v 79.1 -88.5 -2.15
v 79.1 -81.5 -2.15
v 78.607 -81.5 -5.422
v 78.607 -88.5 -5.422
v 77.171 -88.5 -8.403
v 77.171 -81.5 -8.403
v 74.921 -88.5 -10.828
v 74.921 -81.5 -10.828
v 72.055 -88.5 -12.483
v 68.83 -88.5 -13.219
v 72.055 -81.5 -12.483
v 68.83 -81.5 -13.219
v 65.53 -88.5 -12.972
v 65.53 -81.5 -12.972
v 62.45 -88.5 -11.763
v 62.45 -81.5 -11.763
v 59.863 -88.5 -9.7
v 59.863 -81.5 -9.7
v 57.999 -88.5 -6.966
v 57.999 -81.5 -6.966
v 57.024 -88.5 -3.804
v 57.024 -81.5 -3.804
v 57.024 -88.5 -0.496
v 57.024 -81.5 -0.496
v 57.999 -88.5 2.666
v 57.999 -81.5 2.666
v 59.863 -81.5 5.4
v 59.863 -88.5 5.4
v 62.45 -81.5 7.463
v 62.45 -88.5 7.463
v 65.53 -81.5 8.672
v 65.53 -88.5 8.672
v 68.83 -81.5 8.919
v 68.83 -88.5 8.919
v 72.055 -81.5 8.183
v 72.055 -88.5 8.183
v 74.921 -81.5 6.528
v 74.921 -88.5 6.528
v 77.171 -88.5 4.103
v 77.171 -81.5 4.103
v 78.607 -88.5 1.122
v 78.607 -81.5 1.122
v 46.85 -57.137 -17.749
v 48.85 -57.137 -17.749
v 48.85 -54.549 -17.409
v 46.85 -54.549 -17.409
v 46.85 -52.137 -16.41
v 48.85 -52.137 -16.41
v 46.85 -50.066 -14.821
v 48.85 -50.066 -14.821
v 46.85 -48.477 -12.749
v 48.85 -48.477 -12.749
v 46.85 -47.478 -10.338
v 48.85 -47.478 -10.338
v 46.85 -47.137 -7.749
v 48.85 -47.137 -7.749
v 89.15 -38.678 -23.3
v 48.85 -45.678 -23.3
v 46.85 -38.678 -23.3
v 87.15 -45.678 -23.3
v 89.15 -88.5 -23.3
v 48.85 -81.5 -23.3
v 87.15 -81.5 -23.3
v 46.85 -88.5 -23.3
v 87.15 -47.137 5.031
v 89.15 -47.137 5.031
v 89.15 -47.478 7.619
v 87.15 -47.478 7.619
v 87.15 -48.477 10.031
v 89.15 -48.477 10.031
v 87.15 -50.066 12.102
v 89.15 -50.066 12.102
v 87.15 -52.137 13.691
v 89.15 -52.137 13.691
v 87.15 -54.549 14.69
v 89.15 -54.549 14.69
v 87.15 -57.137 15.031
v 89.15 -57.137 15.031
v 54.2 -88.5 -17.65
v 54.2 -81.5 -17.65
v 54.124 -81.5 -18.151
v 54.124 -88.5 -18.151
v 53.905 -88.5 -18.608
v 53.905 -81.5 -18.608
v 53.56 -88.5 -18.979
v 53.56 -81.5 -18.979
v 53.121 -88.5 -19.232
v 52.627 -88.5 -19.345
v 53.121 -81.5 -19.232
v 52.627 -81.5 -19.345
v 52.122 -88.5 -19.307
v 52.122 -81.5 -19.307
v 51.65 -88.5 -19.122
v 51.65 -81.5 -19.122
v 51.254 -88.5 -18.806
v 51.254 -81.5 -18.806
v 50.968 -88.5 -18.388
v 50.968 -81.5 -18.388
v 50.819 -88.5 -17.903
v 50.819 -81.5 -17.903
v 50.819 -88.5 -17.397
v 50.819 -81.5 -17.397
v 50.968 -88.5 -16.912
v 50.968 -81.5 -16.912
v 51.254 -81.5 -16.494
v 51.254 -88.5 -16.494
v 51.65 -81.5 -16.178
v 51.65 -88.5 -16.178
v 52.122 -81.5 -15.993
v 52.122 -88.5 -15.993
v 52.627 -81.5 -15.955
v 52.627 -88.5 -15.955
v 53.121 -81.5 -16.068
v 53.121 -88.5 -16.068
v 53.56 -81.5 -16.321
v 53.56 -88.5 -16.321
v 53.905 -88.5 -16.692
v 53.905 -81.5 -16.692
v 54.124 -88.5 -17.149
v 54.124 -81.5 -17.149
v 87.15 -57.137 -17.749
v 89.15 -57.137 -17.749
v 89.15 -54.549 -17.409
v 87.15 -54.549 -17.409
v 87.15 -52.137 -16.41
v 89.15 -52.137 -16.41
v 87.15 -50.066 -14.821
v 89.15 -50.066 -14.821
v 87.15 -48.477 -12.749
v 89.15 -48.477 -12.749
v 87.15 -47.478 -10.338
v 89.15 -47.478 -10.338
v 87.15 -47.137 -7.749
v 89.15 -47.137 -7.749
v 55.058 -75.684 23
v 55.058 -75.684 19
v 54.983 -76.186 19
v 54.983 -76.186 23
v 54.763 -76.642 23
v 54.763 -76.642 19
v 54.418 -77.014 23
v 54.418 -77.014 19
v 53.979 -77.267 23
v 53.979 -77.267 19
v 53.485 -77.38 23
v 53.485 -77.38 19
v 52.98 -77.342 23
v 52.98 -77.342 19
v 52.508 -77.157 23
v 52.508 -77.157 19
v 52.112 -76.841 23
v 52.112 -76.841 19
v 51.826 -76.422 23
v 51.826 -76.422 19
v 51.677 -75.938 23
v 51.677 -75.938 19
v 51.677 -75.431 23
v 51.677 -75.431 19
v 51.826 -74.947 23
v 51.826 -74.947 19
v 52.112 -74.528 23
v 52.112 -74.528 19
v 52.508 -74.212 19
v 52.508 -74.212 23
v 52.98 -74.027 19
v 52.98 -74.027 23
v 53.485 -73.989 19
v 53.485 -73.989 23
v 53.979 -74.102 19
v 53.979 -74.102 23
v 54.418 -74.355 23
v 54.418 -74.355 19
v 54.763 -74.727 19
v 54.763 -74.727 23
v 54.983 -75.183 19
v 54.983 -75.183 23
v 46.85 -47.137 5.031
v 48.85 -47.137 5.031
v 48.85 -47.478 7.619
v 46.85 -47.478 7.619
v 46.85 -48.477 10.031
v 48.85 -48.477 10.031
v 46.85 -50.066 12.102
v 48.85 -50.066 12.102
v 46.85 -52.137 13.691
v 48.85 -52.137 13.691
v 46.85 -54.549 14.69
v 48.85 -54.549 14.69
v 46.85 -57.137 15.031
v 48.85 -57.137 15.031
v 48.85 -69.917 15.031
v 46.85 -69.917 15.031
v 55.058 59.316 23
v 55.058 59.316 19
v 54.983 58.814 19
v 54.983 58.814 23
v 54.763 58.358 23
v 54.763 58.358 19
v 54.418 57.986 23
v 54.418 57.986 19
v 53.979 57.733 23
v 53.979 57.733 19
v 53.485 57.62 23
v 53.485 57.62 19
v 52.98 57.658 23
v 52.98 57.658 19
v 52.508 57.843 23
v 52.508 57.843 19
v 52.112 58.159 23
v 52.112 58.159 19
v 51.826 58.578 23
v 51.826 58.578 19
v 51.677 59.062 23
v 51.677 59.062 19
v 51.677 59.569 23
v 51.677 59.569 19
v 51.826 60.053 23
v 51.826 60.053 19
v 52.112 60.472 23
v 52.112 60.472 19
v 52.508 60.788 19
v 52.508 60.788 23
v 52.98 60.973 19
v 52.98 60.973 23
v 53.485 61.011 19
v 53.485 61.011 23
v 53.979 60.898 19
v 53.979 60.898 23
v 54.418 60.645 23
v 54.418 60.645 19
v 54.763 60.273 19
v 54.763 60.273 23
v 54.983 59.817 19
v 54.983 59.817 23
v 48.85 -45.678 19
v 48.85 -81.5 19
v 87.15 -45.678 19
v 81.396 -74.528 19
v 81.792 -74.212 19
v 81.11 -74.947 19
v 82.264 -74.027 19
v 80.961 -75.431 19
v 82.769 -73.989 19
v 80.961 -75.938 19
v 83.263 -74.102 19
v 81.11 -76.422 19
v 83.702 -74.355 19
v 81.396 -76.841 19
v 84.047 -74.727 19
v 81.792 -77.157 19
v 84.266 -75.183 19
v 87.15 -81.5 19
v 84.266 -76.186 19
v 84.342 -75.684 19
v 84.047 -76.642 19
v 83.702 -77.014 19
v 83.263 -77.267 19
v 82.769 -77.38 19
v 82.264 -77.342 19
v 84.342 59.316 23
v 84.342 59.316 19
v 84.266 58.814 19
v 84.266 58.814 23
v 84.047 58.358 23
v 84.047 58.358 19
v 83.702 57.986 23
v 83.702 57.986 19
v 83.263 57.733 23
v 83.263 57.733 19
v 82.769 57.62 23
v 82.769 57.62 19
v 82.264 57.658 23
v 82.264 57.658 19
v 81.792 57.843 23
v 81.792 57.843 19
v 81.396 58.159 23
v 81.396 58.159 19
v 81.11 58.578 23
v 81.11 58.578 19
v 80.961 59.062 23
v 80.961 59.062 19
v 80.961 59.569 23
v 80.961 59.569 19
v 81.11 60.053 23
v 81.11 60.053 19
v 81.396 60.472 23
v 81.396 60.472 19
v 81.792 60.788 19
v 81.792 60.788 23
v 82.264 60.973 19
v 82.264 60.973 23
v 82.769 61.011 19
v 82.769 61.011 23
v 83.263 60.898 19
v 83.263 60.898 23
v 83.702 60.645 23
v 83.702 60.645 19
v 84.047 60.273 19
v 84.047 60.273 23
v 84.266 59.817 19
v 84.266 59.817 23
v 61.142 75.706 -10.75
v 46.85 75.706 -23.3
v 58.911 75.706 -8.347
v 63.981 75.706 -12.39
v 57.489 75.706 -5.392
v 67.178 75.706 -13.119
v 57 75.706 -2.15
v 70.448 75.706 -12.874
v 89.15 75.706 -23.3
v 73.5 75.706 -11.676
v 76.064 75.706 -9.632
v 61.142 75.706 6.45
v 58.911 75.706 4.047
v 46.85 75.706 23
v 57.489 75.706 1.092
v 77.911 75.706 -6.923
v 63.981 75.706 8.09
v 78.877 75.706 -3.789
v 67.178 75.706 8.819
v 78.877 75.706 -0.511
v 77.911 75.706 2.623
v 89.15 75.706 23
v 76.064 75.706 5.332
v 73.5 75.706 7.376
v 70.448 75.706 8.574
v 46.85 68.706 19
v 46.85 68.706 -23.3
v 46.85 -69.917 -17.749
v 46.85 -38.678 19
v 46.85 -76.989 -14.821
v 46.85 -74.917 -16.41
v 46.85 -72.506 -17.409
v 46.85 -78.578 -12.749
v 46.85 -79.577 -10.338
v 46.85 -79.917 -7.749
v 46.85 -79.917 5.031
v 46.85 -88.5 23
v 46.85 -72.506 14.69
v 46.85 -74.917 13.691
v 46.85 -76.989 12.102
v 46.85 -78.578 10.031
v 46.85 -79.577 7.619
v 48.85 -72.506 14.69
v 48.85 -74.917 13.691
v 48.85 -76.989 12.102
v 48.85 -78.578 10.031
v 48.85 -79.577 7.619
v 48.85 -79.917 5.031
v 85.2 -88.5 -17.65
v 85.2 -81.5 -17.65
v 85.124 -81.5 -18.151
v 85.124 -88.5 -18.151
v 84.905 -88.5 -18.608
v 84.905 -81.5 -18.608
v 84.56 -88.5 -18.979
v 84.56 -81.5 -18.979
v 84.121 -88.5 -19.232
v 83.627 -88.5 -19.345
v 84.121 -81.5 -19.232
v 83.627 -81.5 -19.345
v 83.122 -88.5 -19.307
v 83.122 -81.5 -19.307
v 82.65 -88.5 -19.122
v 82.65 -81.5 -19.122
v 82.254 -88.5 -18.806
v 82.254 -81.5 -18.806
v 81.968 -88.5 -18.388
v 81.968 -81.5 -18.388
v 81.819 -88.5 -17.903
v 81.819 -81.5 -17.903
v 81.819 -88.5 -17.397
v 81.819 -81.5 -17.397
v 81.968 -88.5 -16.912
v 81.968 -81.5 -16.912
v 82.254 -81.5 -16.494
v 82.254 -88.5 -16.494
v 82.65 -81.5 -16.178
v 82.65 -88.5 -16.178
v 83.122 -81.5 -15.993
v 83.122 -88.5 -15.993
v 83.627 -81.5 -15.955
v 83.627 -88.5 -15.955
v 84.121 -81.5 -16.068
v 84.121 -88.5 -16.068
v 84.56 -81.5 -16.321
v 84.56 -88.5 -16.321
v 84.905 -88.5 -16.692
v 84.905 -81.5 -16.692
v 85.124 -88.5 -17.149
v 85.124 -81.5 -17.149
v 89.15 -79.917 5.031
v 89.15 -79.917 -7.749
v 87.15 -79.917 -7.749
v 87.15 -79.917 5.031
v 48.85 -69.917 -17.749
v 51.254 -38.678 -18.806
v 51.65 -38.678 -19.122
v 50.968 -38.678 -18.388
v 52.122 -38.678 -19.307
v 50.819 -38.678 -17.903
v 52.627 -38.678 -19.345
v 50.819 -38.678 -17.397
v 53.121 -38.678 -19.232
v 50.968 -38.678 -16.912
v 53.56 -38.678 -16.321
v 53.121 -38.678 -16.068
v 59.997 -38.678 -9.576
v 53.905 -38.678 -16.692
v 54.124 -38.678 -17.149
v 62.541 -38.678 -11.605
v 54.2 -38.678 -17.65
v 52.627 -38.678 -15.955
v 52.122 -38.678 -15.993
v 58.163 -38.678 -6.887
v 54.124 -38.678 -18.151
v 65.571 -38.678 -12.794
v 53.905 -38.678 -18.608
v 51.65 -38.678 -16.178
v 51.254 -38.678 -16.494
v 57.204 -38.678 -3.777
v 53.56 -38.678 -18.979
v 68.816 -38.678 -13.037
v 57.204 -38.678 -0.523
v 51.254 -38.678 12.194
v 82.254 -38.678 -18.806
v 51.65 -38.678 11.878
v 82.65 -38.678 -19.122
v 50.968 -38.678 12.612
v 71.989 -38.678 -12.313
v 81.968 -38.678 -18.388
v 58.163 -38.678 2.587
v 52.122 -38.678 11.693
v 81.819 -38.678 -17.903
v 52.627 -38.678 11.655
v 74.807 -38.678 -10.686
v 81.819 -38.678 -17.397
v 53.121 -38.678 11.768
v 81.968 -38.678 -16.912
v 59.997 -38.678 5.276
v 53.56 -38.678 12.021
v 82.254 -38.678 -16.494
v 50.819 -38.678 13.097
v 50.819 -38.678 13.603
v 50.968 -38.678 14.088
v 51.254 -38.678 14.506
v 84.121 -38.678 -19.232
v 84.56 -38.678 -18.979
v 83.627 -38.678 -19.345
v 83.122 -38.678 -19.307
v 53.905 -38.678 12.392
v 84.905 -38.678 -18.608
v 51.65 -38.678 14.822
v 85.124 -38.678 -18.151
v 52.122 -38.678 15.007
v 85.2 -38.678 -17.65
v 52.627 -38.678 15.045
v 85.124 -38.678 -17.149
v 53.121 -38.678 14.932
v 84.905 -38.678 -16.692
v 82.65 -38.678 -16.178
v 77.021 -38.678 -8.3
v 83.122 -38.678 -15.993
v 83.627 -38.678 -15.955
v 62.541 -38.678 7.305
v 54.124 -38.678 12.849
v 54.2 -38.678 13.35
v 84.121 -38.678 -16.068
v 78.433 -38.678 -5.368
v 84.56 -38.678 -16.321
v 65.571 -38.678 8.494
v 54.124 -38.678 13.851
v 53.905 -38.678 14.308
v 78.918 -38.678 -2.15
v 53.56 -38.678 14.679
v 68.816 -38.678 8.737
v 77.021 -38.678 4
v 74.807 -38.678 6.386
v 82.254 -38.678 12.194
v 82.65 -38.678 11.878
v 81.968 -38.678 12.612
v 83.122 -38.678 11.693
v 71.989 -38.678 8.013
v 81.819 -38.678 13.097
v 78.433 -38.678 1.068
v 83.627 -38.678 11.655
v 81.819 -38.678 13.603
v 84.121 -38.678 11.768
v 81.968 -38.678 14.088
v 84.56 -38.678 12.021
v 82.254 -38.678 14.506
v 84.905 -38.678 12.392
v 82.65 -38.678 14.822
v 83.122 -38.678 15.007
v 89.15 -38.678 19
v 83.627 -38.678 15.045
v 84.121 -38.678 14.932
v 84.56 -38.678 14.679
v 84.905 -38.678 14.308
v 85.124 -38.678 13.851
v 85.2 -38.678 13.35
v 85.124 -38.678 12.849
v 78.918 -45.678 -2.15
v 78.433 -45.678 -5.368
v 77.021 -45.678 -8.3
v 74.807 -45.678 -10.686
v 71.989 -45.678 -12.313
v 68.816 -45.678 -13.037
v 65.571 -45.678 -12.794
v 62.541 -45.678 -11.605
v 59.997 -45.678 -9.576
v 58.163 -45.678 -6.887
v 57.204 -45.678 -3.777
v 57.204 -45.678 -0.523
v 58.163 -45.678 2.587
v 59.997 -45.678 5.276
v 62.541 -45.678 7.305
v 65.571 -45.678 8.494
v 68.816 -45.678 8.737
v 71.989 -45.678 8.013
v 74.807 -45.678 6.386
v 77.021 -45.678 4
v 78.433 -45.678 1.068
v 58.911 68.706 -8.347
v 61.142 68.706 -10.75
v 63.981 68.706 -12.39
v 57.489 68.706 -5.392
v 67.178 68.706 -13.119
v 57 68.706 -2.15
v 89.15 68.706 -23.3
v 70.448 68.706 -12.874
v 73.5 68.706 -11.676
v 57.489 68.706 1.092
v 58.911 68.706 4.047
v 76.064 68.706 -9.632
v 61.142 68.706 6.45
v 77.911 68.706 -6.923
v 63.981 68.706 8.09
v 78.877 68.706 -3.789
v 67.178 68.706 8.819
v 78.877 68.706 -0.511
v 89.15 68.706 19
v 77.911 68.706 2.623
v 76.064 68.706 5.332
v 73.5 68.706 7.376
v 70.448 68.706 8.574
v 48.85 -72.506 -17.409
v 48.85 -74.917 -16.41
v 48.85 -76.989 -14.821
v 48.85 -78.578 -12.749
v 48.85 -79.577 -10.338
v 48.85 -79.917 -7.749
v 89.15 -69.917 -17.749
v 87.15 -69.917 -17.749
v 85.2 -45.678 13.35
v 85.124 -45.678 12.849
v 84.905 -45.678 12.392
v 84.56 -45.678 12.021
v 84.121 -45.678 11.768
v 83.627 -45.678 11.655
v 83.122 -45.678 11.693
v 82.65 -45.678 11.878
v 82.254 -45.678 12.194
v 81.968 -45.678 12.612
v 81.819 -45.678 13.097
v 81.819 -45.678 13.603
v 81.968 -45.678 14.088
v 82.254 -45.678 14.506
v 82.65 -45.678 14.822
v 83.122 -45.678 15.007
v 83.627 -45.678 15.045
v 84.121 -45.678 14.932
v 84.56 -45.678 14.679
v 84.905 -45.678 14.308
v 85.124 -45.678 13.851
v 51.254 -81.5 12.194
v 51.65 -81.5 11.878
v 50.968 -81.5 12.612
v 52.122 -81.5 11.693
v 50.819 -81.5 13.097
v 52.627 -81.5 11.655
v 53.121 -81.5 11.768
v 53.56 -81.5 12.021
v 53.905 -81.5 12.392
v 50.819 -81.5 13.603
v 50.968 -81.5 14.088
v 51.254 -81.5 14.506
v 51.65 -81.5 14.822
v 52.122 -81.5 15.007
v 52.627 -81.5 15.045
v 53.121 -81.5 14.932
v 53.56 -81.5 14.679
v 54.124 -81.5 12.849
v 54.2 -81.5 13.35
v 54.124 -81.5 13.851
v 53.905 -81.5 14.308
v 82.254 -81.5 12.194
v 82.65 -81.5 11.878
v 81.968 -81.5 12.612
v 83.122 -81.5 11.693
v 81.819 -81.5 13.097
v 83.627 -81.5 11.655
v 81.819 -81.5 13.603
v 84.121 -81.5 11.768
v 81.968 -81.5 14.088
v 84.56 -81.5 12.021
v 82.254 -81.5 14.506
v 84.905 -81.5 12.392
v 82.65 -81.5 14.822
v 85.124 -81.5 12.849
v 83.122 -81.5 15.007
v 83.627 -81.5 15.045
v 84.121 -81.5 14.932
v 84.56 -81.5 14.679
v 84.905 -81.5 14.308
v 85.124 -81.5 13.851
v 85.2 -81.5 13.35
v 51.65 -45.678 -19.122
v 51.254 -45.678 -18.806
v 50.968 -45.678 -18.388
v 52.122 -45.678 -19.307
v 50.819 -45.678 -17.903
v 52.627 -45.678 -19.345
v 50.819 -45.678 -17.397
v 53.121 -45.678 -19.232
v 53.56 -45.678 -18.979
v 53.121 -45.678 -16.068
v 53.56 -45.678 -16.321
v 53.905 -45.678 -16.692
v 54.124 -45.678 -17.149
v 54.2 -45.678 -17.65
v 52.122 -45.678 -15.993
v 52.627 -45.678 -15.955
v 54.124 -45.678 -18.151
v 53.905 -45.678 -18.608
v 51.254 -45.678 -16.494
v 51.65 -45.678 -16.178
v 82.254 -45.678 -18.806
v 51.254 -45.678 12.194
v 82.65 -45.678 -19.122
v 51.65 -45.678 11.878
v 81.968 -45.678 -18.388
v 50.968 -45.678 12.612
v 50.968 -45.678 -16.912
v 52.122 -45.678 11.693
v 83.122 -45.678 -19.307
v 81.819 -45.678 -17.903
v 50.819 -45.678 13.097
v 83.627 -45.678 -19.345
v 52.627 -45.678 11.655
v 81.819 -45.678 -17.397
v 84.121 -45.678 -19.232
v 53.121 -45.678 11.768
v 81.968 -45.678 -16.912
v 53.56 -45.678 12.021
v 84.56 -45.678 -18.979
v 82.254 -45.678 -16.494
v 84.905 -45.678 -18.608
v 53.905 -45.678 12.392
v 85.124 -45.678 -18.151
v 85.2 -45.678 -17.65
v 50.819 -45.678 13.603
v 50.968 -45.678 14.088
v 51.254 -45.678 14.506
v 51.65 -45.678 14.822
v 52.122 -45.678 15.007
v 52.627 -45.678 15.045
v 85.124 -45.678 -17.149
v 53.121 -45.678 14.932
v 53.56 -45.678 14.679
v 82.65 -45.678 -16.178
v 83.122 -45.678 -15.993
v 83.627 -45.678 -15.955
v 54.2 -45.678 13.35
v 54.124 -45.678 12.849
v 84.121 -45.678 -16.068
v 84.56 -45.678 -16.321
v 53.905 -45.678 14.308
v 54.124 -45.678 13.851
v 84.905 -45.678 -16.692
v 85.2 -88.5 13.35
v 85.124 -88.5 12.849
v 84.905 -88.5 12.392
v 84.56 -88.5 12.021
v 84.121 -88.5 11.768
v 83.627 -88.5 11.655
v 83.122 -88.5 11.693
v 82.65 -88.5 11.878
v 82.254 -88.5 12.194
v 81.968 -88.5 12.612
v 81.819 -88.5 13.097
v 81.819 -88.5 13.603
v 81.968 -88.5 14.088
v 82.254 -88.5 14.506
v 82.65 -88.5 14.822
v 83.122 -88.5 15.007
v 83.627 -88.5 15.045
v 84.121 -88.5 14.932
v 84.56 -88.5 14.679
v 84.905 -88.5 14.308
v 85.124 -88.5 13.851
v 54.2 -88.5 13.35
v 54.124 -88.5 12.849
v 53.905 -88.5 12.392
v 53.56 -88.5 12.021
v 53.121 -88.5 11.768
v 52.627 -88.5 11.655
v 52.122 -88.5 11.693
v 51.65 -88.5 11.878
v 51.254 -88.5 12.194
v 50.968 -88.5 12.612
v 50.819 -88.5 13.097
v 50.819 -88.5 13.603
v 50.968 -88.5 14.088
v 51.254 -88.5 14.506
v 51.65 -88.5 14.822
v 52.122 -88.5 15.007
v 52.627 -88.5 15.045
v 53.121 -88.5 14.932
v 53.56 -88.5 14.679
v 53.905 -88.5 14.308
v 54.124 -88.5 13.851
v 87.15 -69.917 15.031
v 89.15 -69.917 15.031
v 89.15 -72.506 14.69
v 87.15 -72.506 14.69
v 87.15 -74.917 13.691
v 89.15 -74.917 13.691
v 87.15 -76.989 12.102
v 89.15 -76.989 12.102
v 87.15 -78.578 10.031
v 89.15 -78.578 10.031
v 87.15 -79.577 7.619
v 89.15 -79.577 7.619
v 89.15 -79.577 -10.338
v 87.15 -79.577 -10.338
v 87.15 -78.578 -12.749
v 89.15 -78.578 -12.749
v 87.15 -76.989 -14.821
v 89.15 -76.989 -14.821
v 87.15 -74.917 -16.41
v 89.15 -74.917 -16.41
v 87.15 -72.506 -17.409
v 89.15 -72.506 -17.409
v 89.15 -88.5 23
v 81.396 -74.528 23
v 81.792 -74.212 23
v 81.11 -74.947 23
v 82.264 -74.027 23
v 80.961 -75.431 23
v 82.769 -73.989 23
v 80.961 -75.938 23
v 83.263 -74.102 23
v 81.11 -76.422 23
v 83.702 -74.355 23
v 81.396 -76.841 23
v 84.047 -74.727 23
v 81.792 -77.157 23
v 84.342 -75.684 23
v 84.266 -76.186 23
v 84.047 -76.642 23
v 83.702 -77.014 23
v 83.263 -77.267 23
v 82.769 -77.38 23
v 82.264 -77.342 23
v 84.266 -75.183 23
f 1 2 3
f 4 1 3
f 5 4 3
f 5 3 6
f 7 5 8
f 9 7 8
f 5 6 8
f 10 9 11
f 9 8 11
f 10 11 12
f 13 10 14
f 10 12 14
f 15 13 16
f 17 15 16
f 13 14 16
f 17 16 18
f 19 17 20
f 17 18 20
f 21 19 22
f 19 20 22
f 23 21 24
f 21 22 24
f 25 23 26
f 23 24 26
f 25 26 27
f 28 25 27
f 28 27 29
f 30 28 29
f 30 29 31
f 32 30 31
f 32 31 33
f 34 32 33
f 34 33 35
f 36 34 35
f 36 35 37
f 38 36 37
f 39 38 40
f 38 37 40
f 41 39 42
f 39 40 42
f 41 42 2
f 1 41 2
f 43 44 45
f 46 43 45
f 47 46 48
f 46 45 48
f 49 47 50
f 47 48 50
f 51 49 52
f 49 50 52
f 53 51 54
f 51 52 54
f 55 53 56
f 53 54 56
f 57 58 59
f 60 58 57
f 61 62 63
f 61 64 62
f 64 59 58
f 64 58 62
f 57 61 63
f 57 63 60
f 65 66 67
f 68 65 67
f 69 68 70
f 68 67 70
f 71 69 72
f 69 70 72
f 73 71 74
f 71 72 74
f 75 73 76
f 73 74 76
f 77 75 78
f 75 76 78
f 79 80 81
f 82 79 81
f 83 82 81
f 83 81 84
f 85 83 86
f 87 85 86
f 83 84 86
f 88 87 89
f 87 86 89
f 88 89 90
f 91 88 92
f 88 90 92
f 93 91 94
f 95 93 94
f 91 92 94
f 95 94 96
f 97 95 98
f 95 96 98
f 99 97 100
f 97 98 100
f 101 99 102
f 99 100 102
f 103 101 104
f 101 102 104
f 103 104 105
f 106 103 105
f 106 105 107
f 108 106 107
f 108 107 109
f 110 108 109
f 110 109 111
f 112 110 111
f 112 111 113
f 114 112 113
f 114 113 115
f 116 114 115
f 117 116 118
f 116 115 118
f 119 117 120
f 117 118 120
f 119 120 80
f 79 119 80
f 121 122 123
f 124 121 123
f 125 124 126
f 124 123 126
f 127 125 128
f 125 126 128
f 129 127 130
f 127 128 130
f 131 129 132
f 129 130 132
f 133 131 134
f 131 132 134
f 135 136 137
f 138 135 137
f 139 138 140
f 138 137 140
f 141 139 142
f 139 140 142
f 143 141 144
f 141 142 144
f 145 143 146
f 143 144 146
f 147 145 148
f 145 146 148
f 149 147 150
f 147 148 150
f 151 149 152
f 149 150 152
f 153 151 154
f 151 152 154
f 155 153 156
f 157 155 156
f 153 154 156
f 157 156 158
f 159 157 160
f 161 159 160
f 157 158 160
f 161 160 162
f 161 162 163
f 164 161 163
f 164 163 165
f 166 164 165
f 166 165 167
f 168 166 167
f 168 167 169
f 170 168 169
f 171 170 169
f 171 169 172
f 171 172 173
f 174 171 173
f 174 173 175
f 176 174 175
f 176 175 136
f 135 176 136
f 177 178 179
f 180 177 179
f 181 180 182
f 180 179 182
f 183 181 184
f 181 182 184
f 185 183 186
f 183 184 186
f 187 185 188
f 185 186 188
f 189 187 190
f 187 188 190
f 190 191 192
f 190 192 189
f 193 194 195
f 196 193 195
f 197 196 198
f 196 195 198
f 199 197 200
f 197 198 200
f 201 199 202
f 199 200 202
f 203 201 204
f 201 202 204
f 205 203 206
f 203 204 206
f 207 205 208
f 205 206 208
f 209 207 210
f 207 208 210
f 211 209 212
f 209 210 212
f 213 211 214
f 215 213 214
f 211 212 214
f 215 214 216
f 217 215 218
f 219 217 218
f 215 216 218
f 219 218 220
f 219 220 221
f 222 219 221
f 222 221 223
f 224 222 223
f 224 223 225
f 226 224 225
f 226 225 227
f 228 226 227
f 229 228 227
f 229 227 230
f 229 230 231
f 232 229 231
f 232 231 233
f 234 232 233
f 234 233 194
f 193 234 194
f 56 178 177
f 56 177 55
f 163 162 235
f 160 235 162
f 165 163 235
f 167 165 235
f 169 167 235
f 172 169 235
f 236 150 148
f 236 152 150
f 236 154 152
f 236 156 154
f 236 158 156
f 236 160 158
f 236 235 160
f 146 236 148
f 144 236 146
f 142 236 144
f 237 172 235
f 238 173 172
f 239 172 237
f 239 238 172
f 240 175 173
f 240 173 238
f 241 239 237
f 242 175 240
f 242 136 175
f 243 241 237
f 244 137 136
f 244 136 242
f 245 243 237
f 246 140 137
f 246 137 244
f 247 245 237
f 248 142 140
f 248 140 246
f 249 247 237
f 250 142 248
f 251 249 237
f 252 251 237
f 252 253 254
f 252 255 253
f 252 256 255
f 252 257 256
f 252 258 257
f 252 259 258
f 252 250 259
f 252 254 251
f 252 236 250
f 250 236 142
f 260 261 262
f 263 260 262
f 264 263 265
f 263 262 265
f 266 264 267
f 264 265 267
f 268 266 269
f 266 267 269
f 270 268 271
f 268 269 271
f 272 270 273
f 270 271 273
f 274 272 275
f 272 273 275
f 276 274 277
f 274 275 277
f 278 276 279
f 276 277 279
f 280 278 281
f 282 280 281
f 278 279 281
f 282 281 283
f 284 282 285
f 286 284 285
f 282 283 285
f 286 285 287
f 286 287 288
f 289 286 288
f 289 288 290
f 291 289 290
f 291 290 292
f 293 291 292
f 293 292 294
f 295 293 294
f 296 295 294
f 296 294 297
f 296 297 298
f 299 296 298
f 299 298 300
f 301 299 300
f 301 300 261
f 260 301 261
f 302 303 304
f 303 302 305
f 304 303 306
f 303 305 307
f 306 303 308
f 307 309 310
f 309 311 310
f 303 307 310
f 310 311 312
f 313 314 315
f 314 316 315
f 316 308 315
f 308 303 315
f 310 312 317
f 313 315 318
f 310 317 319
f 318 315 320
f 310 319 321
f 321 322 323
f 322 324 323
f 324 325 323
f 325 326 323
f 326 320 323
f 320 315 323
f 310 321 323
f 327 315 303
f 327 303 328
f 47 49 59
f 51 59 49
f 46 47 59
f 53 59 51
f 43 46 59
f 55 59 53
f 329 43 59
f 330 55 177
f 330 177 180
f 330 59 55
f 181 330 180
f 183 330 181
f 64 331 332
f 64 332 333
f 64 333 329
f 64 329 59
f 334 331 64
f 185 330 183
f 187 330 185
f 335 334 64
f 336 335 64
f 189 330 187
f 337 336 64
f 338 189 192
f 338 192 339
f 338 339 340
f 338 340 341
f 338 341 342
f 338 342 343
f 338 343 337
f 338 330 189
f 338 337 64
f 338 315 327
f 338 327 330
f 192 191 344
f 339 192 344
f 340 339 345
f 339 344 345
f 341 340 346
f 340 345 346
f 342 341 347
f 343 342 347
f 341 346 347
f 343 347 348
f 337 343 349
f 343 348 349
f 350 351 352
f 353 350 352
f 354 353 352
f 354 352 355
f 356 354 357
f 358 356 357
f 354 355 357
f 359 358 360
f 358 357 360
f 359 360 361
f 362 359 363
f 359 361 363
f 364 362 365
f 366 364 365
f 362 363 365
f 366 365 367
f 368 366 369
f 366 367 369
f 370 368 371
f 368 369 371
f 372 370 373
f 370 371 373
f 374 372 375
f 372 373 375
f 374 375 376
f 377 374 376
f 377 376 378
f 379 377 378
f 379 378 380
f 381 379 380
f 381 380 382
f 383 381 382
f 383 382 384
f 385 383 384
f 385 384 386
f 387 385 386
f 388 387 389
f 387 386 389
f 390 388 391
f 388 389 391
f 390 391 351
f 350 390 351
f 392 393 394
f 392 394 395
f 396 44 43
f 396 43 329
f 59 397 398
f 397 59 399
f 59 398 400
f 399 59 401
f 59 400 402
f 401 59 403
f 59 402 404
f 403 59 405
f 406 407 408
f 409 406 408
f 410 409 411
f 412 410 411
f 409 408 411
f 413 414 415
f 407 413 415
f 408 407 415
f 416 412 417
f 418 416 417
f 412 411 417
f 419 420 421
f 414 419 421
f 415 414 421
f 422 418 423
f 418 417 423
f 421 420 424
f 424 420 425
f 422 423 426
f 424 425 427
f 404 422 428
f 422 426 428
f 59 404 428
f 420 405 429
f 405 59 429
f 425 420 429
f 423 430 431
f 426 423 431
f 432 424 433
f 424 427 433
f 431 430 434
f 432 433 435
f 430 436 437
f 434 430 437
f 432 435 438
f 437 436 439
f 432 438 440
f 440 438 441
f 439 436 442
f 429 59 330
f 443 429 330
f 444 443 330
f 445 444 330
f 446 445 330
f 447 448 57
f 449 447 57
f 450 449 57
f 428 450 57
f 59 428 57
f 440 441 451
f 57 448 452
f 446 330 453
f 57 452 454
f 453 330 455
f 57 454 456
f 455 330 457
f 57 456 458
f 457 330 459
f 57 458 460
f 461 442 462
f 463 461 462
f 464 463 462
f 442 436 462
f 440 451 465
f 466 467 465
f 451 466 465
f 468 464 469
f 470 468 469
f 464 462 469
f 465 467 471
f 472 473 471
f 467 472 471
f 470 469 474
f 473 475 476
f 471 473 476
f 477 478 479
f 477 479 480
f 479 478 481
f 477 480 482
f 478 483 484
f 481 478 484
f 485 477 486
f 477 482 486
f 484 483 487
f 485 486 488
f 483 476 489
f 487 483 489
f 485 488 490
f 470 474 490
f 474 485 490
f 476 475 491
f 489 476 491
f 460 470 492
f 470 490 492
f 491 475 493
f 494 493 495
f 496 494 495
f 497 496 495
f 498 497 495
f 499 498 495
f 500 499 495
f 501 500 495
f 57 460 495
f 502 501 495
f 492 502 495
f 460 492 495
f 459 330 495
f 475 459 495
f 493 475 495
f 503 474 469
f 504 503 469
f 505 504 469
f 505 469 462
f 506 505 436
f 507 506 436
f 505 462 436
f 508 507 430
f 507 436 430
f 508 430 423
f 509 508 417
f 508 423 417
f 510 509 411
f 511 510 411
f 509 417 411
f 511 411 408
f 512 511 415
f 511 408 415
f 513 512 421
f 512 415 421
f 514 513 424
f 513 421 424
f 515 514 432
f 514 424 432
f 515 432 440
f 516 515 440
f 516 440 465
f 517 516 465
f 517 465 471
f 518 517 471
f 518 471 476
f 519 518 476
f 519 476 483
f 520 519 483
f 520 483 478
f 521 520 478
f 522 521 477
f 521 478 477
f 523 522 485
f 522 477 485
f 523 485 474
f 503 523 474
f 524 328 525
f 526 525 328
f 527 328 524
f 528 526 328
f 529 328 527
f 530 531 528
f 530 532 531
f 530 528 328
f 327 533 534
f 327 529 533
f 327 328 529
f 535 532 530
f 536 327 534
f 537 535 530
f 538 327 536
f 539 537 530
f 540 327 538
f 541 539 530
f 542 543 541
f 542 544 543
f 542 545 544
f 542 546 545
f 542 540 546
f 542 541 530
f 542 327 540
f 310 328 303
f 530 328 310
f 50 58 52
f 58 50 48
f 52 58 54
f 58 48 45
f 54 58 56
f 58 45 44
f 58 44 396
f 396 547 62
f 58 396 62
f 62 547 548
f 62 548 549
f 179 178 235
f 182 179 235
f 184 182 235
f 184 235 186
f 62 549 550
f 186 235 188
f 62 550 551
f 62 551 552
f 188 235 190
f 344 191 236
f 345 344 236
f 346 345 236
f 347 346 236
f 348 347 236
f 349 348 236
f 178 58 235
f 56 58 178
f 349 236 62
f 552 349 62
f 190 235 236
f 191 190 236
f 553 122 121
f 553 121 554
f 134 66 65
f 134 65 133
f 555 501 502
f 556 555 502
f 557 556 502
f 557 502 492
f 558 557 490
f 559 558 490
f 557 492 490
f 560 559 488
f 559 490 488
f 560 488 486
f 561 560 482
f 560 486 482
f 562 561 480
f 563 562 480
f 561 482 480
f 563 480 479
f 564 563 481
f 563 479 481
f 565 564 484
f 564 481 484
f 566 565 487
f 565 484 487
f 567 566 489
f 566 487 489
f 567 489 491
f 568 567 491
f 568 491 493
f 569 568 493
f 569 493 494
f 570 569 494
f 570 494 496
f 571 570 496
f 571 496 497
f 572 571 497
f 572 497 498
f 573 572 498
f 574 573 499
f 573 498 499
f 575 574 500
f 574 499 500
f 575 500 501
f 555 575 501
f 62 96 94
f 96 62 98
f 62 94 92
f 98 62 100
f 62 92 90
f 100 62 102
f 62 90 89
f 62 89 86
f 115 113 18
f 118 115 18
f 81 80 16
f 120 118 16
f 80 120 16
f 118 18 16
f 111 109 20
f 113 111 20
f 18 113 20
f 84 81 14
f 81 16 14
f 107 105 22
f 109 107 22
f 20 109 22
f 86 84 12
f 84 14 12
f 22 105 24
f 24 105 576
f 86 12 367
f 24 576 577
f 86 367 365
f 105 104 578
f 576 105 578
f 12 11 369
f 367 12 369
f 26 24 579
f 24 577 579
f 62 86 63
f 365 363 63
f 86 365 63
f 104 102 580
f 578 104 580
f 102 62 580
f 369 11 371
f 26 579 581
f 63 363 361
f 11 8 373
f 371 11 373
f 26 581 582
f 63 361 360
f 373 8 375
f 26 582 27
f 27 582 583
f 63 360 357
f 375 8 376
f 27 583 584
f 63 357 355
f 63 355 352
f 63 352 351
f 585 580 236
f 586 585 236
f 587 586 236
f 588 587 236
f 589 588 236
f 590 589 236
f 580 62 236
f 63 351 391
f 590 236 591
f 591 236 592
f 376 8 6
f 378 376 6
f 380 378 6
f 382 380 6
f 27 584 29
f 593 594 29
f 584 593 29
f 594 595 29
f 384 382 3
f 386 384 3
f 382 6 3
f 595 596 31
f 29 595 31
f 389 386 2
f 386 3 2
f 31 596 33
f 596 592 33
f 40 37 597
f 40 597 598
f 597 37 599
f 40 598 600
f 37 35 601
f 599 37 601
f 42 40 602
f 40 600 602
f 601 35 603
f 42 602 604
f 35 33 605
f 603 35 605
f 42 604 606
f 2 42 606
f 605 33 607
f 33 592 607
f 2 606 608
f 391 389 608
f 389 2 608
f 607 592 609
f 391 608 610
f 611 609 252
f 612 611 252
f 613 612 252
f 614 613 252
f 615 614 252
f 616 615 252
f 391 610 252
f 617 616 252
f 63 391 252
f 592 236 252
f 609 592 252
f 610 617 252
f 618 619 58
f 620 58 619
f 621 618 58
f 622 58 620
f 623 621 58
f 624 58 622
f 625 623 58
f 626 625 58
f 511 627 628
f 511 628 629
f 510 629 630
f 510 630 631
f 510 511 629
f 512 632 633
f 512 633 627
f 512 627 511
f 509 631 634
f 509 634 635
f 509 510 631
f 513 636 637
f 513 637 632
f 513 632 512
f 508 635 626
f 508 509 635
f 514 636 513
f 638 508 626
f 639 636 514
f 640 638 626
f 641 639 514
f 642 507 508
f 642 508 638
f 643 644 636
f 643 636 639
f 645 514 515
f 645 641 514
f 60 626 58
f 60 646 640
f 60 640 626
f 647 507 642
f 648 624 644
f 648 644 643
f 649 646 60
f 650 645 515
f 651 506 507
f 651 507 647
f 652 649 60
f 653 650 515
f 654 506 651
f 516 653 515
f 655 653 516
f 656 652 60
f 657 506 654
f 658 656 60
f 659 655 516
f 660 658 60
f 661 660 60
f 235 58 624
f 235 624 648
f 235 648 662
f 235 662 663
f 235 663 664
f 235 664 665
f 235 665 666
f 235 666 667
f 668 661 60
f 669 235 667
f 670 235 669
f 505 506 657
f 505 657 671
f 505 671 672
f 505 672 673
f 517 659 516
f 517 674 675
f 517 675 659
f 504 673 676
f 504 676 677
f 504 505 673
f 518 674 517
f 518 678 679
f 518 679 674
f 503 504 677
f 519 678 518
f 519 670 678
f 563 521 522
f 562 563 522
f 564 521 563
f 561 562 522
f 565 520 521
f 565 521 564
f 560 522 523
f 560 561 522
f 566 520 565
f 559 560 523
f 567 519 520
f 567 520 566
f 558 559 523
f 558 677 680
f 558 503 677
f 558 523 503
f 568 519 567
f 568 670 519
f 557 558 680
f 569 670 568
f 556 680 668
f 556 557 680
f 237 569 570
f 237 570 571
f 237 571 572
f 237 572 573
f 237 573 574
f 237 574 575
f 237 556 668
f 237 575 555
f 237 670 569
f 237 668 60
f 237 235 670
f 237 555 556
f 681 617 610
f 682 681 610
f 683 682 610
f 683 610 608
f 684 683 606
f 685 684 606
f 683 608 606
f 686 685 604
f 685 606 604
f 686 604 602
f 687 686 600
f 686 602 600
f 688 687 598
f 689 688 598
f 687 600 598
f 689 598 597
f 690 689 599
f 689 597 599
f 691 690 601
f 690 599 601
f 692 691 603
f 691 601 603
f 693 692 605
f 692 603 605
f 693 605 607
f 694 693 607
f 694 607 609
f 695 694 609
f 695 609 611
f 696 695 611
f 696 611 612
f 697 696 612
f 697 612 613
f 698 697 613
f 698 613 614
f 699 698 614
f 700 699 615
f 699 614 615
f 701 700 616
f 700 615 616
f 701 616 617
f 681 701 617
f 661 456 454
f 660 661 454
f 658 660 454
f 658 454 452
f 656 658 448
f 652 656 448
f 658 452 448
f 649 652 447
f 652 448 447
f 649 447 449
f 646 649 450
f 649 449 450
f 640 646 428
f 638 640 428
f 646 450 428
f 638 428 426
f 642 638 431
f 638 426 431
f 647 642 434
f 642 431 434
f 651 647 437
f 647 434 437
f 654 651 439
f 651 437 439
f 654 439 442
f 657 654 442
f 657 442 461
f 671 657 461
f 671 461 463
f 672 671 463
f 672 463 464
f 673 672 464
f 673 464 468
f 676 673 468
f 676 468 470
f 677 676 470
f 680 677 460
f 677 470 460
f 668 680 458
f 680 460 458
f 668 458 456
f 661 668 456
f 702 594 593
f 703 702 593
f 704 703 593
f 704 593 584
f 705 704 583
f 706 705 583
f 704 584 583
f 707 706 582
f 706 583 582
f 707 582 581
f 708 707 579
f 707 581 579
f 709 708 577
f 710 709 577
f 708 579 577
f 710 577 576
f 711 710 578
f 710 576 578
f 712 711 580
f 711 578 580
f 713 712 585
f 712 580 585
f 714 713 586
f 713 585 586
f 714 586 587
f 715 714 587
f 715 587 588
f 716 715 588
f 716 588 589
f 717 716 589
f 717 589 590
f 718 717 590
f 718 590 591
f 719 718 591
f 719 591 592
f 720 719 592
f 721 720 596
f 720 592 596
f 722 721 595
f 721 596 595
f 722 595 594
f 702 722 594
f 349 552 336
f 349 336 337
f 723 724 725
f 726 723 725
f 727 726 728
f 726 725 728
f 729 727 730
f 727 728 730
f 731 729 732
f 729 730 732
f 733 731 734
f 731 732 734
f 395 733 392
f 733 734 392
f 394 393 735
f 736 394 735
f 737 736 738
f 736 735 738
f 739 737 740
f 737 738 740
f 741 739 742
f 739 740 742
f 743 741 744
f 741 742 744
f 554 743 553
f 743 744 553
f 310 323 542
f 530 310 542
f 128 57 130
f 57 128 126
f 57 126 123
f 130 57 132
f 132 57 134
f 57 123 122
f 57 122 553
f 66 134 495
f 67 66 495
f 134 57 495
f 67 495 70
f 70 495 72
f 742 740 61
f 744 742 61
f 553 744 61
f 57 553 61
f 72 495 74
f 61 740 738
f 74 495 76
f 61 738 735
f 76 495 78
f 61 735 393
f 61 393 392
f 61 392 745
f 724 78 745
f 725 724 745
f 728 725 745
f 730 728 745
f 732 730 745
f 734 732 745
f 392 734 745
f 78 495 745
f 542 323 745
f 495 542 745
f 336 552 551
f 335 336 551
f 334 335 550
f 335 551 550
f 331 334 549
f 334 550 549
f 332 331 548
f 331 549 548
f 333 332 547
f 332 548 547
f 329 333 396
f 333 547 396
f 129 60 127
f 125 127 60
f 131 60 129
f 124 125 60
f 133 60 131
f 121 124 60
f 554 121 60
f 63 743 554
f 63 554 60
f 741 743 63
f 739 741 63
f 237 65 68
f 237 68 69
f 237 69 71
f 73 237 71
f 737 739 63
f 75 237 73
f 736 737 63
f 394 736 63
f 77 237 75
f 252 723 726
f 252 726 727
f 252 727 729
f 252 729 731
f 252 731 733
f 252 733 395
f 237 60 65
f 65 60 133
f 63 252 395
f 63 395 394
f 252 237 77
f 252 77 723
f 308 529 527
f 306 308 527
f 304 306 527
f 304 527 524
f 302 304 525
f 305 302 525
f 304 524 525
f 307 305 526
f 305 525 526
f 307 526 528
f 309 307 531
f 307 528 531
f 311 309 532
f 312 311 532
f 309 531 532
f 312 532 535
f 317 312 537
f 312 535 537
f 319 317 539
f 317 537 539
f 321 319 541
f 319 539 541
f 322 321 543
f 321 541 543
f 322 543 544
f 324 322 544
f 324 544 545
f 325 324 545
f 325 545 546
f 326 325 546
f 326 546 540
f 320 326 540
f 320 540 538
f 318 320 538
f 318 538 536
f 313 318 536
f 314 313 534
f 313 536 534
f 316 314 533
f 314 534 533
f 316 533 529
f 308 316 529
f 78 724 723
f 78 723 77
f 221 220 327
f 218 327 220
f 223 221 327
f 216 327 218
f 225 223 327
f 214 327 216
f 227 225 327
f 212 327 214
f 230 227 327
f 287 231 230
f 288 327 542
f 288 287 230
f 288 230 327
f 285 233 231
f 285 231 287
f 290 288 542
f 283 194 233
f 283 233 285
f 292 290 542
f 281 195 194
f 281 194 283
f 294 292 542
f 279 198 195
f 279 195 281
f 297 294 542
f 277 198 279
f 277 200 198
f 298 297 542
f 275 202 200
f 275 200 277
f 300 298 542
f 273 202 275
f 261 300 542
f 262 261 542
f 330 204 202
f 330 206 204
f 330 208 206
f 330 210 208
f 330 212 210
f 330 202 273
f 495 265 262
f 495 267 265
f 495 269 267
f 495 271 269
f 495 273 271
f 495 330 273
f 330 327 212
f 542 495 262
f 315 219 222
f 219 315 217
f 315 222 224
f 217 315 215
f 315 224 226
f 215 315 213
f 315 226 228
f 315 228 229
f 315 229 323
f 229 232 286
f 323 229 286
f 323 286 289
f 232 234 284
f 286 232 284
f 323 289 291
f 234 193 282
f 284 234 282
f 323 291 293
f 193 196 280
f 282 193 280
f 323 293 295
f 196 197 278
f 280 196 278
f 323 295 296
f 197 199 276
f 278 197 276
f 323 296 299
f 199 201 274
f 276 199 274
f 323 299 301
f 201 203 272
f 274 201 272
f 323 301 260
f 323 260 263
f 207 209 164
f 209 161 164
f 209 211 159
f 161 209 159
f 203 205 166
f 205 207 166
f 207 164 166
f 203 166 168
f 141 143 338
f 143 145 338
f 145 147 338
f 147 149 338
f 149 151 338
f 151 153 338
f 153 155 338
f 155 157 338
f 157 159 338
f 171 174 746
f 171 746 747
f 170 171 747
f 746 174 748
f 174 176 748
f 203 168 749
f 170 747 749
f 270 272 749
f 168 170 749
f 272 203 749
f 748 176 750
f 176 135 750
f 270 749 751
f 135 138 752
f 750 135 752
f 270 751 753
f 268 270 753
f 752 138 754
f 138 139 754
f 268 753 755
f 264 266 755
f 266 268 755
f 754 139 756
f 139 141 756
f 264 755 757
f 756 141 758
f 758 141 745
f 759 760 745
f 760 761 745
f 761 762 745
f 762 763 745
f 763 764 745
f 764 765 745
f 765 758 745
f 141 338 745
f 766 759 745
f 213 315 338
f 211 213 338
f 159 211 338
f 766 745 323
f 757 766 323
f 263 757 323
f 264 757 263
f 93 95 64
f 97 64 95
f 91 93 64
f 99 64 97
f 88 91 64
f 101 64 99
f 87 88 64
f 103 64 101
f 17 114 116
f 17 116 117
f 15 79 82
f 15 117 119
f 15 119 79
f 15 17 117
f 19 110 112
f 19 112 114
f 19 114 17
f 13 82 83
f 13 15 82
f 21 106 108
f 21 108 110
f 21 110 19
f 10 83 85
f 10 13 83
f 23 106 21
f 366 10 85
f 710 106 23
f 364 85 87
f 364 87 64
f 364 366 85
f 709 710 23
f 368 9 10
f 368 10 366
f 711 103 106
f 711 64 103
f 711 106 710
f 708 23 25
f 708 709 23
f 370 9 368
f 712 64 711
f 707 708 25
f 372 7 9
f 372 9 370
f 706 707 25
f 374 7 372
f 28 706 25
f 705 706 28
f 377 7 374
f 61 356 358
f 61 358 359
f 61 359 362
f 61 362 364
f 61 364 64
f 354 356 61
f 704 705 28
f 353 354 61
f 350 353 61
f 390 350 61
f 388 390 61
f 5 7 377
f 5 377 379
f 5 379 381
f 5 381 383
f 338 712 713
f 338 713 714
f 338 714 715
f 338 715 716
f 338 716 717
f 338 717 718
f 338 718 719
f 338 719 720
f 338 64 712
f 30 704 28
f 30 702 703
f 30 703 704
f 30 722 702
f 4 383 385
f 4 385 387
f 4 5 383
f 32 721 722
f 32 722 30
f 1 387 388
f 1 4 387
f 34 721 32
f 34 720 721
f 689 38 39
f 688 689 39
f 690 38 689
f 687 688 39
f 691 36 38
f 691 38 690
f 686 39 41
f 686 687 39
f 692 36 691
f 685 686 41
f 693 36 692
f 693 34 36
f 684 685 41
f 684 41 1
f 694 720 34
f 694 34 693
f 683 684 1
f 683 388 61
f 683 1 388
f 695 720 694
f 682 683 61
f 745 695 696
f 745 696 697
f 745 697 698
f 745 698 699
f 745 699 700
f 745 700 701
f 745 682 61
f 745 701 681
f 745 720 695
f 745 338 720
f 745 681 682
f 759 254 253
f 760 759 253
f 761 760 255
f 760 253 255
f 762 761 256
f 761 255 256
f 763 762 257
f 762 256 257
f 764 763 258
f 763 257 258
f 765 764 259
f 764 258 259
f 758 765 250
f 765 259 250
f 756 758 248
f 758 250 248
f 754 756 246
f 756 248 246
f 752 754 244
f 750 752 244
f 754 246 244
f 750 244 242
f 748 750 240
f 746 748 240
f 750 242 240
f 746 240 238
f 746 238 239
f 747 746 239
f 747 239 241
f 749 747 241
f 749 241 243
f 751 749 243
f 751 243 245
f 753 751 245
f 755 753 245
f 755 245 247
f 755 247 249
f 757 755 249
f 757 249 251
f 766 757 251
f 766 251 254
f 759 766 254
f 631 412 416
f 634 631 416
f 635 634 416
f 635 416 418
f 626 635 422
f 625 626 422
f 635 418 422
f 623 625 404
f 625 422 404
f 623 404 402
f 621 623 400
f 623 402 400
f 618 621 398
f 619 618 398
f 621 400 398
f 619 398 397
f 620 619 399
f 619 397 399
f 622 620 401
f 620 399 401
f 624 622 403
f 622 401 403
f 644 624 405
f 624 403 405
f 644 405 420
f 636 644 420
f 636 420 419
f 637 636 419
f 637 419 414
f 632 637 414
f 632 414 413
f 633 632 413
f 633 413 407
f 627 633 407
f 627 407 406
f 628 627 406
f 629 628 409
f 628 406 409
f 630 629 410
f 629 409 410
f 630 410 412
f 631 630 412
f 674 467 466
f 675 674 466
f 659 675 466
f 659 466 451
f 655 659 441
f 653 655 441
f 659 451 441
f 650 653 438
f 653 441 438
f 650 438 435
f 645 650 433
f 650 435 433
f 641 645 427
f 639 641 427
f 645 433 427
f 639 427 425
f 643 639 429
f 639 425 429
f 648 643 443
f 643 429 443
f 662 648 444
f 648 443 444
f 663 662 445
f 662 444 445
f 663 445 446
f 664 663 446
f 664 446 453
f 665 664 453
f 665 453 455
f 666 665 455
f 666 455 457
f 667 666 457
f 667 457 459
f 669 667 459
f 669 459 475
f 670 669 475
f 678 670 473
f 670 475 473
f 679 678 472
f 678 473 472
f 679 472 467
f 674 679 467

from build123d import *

# Parameters (mm, degrees)
SKETCH029_W             = 42.3
SKETCH029_H             = 164.206055
PAD013_DEPTH            = 4
SKETCH030_W             = 42.3
SKETCH030_H             = 7
PAD014_DEPTH            = 42.3
SKETCH125_W             = 2
SKETCH125_H             = 35.8216107414
PAD049_DEPTH            = 42.3
SKETCH126_R             = 1.7
SKETCH126_R_2           = 10.9177905076
POCKET019_DEPTH         = 7
SKETCH127_R             = 1.7
SKETCH127_R_2           = 11.1
POCKET020_DEPTH         = 7
POCKET021_DEPTH         = 45
SKETCH129_R             = 11
POCKET022_DEPTH         = 7
SKETCH133_R             = 1.7
POCKET026_DEPTH         = 5
BODY025_PITCH_ANGLE     = 90
BODY025_PLACEMENT_ANGLE = -90


with BuildPart() as part:
    # Sketch029 → Pad013 (new body)
    with BuildSketch(Plane.YZ):
        with Locations((0, 4.8969725)):
            Rectangle(SKETCH029_W, SKETCH029_H)
    extrude(amount=PAD013_DEPTH)

    # Sketch030 (on Face6 of Pad013) → Pad014 (join)
    with BuildSketch(Plane.YZ.offset(4)):
        with Locations((0, 40.6783892586)):
            Rectangle(SKETCH030_W, SKETCH030_H)
        with Locations((0, 83.5)):
            Rectangle(SKETCH030_W, SKETCH030_H)
        with Locations((0, -73.706055)):
            Rectangle(SKETCH030_W, SKETCH030_H)
    extrude(amount=PAD014_DEPTH)

    # Sketch125 → Pad049 (join)
    with BuildSketch(Plane.YZ.offset(4)):
        with Locations((-20.15, 62.0891946293)):
            Rectangle(SKETCH125_W, SKETCH125_H)
        with Locations((20.15, 62.0891946293)):
            Rectangle(SKETCH125_W, SKETCH125_H)
    extrude(amount=PAD049_DEPTH)

    # Sketch126 (on Face20 of Pad049) → Pocket019 (cut)
    with BuildSketch(Plane.YX.offset(-37.1783892586)):
        with Locations((-15.5, 40.65)):
            Circle(SKETCH126_R)
        with Locations((15.5, 40.65)):
            Circle(SKETCH126_R)
        with Locations((15.5, 9.65)):
            Circle(SKETCH126_R)
        with Locations((-15.5, 9.65)):
            Circle(SKETCH126_R)
        with Locations((0, 25.15)):
            Circle(SKETCH126_R_2)
    extrude(amount=-POCKET019_DEPTH, mode=Mode.SUBTRACT)

    # Sketch127 (on Face24 of Pocket019) → Pocket020 (cut)
    with BuildSketch(Plane.YX.offset(-80)):
        with Locations((-15.5, 40.65)):
            Circle(SKETCH127_R)
        with Locations((15.5, 40.65)):
            Circle(SKETCH127_R)
        with Locations((15.5, 9.65)):
            Circle(SKETCH127_R)
        with Locations((-15.5, 9.65)):
            Circle(SKETCH127_R)
        with Locations((0, 25.15)):
            Circle(SKETCH127_R_2)
    extrude(amount=-POCKET020_DEPTH, mode=Mode.SUBTRACT)

    # Sketch128 (on Face14 of Pocket020) → Pocket021 (cut)
    with BuildSketch(Plane.ZX.offset(21.15)):
        with BuildLine():
            Line((55.6372167606, 40.749451), (68.417488, 40.749451))
            ThreePointArc((78.417488, 30.749451), (75.4885558119, 37.8205188119), (68.417488, 40.749451))
            Line((78.417488, 30.749451), (78.417488, 17.9691797606))
            ThreePointArc((68.417488, 7.9691797606), (75.4885558119, 10.8981119487), (78.417488, 17.9691797606))
            Line((68.417488, 7.9691797606), (55.6372167606, 7.9691797606))
            ThreePointArc((45.6372167606, 17.9691797606), (48.5661489487, 10.8981119487), (55.6372167606, 7.9691797606))
            Line((45.6372167606, 17.9691797606), (45.6372167606, 30.749451))
            ThreePointArc((55.6372167606, 40.749451), (48.5661489487, 37.8205188119), (45.6372167606, 30.749451))
        make_face()
    extrude(amount=-POCKET021_DEPTH, mode=Mode.SUBTRACT)

    # Sketch129 (on Face30 of Pocket021) → Pocket022 (cut)
    with BuildSketch(Plane(origin=(0, 0, -70.206055), x_dir=(0, -1, 0), z_dir=(0, 0, 1))):
        with Locations((0, 25.15)):
            Circle(SKETCH129_R)
    extrude(amount=-POCKET022_DEPTH, mode=Mode.SUBTRACT)

    # Sketch133 (on Face10 of Pocket022) → Pocket026 (cut)
    with BuildSketch(Plane.YZ.offset(4)):
        with Locations((-14.6419561845, 74.184478)):
            Circle(SKETCH133_R)
        with Locations((14.6419561845, 74.184478)):
            Circle(SKETCH133_R)
        with Locations((14.6419561845, -60.815522)):
            Circle(SKETCH133_R)
        with Locations((-14.6419561845, -60.815522)):
            Circle(SKETCH133_R)
    extrude(amount=-POCKET026_DEPTH, mode=Mode.SUBTRACT)


with BuildPart() as part_1:
    # Body025 pitch: moved
    add(part.part.rotate(Axis((0, 0, 0), (0, 1, 0)), BODY025_PITCH_ANGLE))


with BuildPart() as part_2:
    # Body025 placement: moved
    add(part_1.part.moved(Location((68, -1.5, 23))).rotate(Axis((68, -1.5, 23), (0, 0, 1)), BODY025_PLACEMENT_ANGLE))


solid = part_2.part
